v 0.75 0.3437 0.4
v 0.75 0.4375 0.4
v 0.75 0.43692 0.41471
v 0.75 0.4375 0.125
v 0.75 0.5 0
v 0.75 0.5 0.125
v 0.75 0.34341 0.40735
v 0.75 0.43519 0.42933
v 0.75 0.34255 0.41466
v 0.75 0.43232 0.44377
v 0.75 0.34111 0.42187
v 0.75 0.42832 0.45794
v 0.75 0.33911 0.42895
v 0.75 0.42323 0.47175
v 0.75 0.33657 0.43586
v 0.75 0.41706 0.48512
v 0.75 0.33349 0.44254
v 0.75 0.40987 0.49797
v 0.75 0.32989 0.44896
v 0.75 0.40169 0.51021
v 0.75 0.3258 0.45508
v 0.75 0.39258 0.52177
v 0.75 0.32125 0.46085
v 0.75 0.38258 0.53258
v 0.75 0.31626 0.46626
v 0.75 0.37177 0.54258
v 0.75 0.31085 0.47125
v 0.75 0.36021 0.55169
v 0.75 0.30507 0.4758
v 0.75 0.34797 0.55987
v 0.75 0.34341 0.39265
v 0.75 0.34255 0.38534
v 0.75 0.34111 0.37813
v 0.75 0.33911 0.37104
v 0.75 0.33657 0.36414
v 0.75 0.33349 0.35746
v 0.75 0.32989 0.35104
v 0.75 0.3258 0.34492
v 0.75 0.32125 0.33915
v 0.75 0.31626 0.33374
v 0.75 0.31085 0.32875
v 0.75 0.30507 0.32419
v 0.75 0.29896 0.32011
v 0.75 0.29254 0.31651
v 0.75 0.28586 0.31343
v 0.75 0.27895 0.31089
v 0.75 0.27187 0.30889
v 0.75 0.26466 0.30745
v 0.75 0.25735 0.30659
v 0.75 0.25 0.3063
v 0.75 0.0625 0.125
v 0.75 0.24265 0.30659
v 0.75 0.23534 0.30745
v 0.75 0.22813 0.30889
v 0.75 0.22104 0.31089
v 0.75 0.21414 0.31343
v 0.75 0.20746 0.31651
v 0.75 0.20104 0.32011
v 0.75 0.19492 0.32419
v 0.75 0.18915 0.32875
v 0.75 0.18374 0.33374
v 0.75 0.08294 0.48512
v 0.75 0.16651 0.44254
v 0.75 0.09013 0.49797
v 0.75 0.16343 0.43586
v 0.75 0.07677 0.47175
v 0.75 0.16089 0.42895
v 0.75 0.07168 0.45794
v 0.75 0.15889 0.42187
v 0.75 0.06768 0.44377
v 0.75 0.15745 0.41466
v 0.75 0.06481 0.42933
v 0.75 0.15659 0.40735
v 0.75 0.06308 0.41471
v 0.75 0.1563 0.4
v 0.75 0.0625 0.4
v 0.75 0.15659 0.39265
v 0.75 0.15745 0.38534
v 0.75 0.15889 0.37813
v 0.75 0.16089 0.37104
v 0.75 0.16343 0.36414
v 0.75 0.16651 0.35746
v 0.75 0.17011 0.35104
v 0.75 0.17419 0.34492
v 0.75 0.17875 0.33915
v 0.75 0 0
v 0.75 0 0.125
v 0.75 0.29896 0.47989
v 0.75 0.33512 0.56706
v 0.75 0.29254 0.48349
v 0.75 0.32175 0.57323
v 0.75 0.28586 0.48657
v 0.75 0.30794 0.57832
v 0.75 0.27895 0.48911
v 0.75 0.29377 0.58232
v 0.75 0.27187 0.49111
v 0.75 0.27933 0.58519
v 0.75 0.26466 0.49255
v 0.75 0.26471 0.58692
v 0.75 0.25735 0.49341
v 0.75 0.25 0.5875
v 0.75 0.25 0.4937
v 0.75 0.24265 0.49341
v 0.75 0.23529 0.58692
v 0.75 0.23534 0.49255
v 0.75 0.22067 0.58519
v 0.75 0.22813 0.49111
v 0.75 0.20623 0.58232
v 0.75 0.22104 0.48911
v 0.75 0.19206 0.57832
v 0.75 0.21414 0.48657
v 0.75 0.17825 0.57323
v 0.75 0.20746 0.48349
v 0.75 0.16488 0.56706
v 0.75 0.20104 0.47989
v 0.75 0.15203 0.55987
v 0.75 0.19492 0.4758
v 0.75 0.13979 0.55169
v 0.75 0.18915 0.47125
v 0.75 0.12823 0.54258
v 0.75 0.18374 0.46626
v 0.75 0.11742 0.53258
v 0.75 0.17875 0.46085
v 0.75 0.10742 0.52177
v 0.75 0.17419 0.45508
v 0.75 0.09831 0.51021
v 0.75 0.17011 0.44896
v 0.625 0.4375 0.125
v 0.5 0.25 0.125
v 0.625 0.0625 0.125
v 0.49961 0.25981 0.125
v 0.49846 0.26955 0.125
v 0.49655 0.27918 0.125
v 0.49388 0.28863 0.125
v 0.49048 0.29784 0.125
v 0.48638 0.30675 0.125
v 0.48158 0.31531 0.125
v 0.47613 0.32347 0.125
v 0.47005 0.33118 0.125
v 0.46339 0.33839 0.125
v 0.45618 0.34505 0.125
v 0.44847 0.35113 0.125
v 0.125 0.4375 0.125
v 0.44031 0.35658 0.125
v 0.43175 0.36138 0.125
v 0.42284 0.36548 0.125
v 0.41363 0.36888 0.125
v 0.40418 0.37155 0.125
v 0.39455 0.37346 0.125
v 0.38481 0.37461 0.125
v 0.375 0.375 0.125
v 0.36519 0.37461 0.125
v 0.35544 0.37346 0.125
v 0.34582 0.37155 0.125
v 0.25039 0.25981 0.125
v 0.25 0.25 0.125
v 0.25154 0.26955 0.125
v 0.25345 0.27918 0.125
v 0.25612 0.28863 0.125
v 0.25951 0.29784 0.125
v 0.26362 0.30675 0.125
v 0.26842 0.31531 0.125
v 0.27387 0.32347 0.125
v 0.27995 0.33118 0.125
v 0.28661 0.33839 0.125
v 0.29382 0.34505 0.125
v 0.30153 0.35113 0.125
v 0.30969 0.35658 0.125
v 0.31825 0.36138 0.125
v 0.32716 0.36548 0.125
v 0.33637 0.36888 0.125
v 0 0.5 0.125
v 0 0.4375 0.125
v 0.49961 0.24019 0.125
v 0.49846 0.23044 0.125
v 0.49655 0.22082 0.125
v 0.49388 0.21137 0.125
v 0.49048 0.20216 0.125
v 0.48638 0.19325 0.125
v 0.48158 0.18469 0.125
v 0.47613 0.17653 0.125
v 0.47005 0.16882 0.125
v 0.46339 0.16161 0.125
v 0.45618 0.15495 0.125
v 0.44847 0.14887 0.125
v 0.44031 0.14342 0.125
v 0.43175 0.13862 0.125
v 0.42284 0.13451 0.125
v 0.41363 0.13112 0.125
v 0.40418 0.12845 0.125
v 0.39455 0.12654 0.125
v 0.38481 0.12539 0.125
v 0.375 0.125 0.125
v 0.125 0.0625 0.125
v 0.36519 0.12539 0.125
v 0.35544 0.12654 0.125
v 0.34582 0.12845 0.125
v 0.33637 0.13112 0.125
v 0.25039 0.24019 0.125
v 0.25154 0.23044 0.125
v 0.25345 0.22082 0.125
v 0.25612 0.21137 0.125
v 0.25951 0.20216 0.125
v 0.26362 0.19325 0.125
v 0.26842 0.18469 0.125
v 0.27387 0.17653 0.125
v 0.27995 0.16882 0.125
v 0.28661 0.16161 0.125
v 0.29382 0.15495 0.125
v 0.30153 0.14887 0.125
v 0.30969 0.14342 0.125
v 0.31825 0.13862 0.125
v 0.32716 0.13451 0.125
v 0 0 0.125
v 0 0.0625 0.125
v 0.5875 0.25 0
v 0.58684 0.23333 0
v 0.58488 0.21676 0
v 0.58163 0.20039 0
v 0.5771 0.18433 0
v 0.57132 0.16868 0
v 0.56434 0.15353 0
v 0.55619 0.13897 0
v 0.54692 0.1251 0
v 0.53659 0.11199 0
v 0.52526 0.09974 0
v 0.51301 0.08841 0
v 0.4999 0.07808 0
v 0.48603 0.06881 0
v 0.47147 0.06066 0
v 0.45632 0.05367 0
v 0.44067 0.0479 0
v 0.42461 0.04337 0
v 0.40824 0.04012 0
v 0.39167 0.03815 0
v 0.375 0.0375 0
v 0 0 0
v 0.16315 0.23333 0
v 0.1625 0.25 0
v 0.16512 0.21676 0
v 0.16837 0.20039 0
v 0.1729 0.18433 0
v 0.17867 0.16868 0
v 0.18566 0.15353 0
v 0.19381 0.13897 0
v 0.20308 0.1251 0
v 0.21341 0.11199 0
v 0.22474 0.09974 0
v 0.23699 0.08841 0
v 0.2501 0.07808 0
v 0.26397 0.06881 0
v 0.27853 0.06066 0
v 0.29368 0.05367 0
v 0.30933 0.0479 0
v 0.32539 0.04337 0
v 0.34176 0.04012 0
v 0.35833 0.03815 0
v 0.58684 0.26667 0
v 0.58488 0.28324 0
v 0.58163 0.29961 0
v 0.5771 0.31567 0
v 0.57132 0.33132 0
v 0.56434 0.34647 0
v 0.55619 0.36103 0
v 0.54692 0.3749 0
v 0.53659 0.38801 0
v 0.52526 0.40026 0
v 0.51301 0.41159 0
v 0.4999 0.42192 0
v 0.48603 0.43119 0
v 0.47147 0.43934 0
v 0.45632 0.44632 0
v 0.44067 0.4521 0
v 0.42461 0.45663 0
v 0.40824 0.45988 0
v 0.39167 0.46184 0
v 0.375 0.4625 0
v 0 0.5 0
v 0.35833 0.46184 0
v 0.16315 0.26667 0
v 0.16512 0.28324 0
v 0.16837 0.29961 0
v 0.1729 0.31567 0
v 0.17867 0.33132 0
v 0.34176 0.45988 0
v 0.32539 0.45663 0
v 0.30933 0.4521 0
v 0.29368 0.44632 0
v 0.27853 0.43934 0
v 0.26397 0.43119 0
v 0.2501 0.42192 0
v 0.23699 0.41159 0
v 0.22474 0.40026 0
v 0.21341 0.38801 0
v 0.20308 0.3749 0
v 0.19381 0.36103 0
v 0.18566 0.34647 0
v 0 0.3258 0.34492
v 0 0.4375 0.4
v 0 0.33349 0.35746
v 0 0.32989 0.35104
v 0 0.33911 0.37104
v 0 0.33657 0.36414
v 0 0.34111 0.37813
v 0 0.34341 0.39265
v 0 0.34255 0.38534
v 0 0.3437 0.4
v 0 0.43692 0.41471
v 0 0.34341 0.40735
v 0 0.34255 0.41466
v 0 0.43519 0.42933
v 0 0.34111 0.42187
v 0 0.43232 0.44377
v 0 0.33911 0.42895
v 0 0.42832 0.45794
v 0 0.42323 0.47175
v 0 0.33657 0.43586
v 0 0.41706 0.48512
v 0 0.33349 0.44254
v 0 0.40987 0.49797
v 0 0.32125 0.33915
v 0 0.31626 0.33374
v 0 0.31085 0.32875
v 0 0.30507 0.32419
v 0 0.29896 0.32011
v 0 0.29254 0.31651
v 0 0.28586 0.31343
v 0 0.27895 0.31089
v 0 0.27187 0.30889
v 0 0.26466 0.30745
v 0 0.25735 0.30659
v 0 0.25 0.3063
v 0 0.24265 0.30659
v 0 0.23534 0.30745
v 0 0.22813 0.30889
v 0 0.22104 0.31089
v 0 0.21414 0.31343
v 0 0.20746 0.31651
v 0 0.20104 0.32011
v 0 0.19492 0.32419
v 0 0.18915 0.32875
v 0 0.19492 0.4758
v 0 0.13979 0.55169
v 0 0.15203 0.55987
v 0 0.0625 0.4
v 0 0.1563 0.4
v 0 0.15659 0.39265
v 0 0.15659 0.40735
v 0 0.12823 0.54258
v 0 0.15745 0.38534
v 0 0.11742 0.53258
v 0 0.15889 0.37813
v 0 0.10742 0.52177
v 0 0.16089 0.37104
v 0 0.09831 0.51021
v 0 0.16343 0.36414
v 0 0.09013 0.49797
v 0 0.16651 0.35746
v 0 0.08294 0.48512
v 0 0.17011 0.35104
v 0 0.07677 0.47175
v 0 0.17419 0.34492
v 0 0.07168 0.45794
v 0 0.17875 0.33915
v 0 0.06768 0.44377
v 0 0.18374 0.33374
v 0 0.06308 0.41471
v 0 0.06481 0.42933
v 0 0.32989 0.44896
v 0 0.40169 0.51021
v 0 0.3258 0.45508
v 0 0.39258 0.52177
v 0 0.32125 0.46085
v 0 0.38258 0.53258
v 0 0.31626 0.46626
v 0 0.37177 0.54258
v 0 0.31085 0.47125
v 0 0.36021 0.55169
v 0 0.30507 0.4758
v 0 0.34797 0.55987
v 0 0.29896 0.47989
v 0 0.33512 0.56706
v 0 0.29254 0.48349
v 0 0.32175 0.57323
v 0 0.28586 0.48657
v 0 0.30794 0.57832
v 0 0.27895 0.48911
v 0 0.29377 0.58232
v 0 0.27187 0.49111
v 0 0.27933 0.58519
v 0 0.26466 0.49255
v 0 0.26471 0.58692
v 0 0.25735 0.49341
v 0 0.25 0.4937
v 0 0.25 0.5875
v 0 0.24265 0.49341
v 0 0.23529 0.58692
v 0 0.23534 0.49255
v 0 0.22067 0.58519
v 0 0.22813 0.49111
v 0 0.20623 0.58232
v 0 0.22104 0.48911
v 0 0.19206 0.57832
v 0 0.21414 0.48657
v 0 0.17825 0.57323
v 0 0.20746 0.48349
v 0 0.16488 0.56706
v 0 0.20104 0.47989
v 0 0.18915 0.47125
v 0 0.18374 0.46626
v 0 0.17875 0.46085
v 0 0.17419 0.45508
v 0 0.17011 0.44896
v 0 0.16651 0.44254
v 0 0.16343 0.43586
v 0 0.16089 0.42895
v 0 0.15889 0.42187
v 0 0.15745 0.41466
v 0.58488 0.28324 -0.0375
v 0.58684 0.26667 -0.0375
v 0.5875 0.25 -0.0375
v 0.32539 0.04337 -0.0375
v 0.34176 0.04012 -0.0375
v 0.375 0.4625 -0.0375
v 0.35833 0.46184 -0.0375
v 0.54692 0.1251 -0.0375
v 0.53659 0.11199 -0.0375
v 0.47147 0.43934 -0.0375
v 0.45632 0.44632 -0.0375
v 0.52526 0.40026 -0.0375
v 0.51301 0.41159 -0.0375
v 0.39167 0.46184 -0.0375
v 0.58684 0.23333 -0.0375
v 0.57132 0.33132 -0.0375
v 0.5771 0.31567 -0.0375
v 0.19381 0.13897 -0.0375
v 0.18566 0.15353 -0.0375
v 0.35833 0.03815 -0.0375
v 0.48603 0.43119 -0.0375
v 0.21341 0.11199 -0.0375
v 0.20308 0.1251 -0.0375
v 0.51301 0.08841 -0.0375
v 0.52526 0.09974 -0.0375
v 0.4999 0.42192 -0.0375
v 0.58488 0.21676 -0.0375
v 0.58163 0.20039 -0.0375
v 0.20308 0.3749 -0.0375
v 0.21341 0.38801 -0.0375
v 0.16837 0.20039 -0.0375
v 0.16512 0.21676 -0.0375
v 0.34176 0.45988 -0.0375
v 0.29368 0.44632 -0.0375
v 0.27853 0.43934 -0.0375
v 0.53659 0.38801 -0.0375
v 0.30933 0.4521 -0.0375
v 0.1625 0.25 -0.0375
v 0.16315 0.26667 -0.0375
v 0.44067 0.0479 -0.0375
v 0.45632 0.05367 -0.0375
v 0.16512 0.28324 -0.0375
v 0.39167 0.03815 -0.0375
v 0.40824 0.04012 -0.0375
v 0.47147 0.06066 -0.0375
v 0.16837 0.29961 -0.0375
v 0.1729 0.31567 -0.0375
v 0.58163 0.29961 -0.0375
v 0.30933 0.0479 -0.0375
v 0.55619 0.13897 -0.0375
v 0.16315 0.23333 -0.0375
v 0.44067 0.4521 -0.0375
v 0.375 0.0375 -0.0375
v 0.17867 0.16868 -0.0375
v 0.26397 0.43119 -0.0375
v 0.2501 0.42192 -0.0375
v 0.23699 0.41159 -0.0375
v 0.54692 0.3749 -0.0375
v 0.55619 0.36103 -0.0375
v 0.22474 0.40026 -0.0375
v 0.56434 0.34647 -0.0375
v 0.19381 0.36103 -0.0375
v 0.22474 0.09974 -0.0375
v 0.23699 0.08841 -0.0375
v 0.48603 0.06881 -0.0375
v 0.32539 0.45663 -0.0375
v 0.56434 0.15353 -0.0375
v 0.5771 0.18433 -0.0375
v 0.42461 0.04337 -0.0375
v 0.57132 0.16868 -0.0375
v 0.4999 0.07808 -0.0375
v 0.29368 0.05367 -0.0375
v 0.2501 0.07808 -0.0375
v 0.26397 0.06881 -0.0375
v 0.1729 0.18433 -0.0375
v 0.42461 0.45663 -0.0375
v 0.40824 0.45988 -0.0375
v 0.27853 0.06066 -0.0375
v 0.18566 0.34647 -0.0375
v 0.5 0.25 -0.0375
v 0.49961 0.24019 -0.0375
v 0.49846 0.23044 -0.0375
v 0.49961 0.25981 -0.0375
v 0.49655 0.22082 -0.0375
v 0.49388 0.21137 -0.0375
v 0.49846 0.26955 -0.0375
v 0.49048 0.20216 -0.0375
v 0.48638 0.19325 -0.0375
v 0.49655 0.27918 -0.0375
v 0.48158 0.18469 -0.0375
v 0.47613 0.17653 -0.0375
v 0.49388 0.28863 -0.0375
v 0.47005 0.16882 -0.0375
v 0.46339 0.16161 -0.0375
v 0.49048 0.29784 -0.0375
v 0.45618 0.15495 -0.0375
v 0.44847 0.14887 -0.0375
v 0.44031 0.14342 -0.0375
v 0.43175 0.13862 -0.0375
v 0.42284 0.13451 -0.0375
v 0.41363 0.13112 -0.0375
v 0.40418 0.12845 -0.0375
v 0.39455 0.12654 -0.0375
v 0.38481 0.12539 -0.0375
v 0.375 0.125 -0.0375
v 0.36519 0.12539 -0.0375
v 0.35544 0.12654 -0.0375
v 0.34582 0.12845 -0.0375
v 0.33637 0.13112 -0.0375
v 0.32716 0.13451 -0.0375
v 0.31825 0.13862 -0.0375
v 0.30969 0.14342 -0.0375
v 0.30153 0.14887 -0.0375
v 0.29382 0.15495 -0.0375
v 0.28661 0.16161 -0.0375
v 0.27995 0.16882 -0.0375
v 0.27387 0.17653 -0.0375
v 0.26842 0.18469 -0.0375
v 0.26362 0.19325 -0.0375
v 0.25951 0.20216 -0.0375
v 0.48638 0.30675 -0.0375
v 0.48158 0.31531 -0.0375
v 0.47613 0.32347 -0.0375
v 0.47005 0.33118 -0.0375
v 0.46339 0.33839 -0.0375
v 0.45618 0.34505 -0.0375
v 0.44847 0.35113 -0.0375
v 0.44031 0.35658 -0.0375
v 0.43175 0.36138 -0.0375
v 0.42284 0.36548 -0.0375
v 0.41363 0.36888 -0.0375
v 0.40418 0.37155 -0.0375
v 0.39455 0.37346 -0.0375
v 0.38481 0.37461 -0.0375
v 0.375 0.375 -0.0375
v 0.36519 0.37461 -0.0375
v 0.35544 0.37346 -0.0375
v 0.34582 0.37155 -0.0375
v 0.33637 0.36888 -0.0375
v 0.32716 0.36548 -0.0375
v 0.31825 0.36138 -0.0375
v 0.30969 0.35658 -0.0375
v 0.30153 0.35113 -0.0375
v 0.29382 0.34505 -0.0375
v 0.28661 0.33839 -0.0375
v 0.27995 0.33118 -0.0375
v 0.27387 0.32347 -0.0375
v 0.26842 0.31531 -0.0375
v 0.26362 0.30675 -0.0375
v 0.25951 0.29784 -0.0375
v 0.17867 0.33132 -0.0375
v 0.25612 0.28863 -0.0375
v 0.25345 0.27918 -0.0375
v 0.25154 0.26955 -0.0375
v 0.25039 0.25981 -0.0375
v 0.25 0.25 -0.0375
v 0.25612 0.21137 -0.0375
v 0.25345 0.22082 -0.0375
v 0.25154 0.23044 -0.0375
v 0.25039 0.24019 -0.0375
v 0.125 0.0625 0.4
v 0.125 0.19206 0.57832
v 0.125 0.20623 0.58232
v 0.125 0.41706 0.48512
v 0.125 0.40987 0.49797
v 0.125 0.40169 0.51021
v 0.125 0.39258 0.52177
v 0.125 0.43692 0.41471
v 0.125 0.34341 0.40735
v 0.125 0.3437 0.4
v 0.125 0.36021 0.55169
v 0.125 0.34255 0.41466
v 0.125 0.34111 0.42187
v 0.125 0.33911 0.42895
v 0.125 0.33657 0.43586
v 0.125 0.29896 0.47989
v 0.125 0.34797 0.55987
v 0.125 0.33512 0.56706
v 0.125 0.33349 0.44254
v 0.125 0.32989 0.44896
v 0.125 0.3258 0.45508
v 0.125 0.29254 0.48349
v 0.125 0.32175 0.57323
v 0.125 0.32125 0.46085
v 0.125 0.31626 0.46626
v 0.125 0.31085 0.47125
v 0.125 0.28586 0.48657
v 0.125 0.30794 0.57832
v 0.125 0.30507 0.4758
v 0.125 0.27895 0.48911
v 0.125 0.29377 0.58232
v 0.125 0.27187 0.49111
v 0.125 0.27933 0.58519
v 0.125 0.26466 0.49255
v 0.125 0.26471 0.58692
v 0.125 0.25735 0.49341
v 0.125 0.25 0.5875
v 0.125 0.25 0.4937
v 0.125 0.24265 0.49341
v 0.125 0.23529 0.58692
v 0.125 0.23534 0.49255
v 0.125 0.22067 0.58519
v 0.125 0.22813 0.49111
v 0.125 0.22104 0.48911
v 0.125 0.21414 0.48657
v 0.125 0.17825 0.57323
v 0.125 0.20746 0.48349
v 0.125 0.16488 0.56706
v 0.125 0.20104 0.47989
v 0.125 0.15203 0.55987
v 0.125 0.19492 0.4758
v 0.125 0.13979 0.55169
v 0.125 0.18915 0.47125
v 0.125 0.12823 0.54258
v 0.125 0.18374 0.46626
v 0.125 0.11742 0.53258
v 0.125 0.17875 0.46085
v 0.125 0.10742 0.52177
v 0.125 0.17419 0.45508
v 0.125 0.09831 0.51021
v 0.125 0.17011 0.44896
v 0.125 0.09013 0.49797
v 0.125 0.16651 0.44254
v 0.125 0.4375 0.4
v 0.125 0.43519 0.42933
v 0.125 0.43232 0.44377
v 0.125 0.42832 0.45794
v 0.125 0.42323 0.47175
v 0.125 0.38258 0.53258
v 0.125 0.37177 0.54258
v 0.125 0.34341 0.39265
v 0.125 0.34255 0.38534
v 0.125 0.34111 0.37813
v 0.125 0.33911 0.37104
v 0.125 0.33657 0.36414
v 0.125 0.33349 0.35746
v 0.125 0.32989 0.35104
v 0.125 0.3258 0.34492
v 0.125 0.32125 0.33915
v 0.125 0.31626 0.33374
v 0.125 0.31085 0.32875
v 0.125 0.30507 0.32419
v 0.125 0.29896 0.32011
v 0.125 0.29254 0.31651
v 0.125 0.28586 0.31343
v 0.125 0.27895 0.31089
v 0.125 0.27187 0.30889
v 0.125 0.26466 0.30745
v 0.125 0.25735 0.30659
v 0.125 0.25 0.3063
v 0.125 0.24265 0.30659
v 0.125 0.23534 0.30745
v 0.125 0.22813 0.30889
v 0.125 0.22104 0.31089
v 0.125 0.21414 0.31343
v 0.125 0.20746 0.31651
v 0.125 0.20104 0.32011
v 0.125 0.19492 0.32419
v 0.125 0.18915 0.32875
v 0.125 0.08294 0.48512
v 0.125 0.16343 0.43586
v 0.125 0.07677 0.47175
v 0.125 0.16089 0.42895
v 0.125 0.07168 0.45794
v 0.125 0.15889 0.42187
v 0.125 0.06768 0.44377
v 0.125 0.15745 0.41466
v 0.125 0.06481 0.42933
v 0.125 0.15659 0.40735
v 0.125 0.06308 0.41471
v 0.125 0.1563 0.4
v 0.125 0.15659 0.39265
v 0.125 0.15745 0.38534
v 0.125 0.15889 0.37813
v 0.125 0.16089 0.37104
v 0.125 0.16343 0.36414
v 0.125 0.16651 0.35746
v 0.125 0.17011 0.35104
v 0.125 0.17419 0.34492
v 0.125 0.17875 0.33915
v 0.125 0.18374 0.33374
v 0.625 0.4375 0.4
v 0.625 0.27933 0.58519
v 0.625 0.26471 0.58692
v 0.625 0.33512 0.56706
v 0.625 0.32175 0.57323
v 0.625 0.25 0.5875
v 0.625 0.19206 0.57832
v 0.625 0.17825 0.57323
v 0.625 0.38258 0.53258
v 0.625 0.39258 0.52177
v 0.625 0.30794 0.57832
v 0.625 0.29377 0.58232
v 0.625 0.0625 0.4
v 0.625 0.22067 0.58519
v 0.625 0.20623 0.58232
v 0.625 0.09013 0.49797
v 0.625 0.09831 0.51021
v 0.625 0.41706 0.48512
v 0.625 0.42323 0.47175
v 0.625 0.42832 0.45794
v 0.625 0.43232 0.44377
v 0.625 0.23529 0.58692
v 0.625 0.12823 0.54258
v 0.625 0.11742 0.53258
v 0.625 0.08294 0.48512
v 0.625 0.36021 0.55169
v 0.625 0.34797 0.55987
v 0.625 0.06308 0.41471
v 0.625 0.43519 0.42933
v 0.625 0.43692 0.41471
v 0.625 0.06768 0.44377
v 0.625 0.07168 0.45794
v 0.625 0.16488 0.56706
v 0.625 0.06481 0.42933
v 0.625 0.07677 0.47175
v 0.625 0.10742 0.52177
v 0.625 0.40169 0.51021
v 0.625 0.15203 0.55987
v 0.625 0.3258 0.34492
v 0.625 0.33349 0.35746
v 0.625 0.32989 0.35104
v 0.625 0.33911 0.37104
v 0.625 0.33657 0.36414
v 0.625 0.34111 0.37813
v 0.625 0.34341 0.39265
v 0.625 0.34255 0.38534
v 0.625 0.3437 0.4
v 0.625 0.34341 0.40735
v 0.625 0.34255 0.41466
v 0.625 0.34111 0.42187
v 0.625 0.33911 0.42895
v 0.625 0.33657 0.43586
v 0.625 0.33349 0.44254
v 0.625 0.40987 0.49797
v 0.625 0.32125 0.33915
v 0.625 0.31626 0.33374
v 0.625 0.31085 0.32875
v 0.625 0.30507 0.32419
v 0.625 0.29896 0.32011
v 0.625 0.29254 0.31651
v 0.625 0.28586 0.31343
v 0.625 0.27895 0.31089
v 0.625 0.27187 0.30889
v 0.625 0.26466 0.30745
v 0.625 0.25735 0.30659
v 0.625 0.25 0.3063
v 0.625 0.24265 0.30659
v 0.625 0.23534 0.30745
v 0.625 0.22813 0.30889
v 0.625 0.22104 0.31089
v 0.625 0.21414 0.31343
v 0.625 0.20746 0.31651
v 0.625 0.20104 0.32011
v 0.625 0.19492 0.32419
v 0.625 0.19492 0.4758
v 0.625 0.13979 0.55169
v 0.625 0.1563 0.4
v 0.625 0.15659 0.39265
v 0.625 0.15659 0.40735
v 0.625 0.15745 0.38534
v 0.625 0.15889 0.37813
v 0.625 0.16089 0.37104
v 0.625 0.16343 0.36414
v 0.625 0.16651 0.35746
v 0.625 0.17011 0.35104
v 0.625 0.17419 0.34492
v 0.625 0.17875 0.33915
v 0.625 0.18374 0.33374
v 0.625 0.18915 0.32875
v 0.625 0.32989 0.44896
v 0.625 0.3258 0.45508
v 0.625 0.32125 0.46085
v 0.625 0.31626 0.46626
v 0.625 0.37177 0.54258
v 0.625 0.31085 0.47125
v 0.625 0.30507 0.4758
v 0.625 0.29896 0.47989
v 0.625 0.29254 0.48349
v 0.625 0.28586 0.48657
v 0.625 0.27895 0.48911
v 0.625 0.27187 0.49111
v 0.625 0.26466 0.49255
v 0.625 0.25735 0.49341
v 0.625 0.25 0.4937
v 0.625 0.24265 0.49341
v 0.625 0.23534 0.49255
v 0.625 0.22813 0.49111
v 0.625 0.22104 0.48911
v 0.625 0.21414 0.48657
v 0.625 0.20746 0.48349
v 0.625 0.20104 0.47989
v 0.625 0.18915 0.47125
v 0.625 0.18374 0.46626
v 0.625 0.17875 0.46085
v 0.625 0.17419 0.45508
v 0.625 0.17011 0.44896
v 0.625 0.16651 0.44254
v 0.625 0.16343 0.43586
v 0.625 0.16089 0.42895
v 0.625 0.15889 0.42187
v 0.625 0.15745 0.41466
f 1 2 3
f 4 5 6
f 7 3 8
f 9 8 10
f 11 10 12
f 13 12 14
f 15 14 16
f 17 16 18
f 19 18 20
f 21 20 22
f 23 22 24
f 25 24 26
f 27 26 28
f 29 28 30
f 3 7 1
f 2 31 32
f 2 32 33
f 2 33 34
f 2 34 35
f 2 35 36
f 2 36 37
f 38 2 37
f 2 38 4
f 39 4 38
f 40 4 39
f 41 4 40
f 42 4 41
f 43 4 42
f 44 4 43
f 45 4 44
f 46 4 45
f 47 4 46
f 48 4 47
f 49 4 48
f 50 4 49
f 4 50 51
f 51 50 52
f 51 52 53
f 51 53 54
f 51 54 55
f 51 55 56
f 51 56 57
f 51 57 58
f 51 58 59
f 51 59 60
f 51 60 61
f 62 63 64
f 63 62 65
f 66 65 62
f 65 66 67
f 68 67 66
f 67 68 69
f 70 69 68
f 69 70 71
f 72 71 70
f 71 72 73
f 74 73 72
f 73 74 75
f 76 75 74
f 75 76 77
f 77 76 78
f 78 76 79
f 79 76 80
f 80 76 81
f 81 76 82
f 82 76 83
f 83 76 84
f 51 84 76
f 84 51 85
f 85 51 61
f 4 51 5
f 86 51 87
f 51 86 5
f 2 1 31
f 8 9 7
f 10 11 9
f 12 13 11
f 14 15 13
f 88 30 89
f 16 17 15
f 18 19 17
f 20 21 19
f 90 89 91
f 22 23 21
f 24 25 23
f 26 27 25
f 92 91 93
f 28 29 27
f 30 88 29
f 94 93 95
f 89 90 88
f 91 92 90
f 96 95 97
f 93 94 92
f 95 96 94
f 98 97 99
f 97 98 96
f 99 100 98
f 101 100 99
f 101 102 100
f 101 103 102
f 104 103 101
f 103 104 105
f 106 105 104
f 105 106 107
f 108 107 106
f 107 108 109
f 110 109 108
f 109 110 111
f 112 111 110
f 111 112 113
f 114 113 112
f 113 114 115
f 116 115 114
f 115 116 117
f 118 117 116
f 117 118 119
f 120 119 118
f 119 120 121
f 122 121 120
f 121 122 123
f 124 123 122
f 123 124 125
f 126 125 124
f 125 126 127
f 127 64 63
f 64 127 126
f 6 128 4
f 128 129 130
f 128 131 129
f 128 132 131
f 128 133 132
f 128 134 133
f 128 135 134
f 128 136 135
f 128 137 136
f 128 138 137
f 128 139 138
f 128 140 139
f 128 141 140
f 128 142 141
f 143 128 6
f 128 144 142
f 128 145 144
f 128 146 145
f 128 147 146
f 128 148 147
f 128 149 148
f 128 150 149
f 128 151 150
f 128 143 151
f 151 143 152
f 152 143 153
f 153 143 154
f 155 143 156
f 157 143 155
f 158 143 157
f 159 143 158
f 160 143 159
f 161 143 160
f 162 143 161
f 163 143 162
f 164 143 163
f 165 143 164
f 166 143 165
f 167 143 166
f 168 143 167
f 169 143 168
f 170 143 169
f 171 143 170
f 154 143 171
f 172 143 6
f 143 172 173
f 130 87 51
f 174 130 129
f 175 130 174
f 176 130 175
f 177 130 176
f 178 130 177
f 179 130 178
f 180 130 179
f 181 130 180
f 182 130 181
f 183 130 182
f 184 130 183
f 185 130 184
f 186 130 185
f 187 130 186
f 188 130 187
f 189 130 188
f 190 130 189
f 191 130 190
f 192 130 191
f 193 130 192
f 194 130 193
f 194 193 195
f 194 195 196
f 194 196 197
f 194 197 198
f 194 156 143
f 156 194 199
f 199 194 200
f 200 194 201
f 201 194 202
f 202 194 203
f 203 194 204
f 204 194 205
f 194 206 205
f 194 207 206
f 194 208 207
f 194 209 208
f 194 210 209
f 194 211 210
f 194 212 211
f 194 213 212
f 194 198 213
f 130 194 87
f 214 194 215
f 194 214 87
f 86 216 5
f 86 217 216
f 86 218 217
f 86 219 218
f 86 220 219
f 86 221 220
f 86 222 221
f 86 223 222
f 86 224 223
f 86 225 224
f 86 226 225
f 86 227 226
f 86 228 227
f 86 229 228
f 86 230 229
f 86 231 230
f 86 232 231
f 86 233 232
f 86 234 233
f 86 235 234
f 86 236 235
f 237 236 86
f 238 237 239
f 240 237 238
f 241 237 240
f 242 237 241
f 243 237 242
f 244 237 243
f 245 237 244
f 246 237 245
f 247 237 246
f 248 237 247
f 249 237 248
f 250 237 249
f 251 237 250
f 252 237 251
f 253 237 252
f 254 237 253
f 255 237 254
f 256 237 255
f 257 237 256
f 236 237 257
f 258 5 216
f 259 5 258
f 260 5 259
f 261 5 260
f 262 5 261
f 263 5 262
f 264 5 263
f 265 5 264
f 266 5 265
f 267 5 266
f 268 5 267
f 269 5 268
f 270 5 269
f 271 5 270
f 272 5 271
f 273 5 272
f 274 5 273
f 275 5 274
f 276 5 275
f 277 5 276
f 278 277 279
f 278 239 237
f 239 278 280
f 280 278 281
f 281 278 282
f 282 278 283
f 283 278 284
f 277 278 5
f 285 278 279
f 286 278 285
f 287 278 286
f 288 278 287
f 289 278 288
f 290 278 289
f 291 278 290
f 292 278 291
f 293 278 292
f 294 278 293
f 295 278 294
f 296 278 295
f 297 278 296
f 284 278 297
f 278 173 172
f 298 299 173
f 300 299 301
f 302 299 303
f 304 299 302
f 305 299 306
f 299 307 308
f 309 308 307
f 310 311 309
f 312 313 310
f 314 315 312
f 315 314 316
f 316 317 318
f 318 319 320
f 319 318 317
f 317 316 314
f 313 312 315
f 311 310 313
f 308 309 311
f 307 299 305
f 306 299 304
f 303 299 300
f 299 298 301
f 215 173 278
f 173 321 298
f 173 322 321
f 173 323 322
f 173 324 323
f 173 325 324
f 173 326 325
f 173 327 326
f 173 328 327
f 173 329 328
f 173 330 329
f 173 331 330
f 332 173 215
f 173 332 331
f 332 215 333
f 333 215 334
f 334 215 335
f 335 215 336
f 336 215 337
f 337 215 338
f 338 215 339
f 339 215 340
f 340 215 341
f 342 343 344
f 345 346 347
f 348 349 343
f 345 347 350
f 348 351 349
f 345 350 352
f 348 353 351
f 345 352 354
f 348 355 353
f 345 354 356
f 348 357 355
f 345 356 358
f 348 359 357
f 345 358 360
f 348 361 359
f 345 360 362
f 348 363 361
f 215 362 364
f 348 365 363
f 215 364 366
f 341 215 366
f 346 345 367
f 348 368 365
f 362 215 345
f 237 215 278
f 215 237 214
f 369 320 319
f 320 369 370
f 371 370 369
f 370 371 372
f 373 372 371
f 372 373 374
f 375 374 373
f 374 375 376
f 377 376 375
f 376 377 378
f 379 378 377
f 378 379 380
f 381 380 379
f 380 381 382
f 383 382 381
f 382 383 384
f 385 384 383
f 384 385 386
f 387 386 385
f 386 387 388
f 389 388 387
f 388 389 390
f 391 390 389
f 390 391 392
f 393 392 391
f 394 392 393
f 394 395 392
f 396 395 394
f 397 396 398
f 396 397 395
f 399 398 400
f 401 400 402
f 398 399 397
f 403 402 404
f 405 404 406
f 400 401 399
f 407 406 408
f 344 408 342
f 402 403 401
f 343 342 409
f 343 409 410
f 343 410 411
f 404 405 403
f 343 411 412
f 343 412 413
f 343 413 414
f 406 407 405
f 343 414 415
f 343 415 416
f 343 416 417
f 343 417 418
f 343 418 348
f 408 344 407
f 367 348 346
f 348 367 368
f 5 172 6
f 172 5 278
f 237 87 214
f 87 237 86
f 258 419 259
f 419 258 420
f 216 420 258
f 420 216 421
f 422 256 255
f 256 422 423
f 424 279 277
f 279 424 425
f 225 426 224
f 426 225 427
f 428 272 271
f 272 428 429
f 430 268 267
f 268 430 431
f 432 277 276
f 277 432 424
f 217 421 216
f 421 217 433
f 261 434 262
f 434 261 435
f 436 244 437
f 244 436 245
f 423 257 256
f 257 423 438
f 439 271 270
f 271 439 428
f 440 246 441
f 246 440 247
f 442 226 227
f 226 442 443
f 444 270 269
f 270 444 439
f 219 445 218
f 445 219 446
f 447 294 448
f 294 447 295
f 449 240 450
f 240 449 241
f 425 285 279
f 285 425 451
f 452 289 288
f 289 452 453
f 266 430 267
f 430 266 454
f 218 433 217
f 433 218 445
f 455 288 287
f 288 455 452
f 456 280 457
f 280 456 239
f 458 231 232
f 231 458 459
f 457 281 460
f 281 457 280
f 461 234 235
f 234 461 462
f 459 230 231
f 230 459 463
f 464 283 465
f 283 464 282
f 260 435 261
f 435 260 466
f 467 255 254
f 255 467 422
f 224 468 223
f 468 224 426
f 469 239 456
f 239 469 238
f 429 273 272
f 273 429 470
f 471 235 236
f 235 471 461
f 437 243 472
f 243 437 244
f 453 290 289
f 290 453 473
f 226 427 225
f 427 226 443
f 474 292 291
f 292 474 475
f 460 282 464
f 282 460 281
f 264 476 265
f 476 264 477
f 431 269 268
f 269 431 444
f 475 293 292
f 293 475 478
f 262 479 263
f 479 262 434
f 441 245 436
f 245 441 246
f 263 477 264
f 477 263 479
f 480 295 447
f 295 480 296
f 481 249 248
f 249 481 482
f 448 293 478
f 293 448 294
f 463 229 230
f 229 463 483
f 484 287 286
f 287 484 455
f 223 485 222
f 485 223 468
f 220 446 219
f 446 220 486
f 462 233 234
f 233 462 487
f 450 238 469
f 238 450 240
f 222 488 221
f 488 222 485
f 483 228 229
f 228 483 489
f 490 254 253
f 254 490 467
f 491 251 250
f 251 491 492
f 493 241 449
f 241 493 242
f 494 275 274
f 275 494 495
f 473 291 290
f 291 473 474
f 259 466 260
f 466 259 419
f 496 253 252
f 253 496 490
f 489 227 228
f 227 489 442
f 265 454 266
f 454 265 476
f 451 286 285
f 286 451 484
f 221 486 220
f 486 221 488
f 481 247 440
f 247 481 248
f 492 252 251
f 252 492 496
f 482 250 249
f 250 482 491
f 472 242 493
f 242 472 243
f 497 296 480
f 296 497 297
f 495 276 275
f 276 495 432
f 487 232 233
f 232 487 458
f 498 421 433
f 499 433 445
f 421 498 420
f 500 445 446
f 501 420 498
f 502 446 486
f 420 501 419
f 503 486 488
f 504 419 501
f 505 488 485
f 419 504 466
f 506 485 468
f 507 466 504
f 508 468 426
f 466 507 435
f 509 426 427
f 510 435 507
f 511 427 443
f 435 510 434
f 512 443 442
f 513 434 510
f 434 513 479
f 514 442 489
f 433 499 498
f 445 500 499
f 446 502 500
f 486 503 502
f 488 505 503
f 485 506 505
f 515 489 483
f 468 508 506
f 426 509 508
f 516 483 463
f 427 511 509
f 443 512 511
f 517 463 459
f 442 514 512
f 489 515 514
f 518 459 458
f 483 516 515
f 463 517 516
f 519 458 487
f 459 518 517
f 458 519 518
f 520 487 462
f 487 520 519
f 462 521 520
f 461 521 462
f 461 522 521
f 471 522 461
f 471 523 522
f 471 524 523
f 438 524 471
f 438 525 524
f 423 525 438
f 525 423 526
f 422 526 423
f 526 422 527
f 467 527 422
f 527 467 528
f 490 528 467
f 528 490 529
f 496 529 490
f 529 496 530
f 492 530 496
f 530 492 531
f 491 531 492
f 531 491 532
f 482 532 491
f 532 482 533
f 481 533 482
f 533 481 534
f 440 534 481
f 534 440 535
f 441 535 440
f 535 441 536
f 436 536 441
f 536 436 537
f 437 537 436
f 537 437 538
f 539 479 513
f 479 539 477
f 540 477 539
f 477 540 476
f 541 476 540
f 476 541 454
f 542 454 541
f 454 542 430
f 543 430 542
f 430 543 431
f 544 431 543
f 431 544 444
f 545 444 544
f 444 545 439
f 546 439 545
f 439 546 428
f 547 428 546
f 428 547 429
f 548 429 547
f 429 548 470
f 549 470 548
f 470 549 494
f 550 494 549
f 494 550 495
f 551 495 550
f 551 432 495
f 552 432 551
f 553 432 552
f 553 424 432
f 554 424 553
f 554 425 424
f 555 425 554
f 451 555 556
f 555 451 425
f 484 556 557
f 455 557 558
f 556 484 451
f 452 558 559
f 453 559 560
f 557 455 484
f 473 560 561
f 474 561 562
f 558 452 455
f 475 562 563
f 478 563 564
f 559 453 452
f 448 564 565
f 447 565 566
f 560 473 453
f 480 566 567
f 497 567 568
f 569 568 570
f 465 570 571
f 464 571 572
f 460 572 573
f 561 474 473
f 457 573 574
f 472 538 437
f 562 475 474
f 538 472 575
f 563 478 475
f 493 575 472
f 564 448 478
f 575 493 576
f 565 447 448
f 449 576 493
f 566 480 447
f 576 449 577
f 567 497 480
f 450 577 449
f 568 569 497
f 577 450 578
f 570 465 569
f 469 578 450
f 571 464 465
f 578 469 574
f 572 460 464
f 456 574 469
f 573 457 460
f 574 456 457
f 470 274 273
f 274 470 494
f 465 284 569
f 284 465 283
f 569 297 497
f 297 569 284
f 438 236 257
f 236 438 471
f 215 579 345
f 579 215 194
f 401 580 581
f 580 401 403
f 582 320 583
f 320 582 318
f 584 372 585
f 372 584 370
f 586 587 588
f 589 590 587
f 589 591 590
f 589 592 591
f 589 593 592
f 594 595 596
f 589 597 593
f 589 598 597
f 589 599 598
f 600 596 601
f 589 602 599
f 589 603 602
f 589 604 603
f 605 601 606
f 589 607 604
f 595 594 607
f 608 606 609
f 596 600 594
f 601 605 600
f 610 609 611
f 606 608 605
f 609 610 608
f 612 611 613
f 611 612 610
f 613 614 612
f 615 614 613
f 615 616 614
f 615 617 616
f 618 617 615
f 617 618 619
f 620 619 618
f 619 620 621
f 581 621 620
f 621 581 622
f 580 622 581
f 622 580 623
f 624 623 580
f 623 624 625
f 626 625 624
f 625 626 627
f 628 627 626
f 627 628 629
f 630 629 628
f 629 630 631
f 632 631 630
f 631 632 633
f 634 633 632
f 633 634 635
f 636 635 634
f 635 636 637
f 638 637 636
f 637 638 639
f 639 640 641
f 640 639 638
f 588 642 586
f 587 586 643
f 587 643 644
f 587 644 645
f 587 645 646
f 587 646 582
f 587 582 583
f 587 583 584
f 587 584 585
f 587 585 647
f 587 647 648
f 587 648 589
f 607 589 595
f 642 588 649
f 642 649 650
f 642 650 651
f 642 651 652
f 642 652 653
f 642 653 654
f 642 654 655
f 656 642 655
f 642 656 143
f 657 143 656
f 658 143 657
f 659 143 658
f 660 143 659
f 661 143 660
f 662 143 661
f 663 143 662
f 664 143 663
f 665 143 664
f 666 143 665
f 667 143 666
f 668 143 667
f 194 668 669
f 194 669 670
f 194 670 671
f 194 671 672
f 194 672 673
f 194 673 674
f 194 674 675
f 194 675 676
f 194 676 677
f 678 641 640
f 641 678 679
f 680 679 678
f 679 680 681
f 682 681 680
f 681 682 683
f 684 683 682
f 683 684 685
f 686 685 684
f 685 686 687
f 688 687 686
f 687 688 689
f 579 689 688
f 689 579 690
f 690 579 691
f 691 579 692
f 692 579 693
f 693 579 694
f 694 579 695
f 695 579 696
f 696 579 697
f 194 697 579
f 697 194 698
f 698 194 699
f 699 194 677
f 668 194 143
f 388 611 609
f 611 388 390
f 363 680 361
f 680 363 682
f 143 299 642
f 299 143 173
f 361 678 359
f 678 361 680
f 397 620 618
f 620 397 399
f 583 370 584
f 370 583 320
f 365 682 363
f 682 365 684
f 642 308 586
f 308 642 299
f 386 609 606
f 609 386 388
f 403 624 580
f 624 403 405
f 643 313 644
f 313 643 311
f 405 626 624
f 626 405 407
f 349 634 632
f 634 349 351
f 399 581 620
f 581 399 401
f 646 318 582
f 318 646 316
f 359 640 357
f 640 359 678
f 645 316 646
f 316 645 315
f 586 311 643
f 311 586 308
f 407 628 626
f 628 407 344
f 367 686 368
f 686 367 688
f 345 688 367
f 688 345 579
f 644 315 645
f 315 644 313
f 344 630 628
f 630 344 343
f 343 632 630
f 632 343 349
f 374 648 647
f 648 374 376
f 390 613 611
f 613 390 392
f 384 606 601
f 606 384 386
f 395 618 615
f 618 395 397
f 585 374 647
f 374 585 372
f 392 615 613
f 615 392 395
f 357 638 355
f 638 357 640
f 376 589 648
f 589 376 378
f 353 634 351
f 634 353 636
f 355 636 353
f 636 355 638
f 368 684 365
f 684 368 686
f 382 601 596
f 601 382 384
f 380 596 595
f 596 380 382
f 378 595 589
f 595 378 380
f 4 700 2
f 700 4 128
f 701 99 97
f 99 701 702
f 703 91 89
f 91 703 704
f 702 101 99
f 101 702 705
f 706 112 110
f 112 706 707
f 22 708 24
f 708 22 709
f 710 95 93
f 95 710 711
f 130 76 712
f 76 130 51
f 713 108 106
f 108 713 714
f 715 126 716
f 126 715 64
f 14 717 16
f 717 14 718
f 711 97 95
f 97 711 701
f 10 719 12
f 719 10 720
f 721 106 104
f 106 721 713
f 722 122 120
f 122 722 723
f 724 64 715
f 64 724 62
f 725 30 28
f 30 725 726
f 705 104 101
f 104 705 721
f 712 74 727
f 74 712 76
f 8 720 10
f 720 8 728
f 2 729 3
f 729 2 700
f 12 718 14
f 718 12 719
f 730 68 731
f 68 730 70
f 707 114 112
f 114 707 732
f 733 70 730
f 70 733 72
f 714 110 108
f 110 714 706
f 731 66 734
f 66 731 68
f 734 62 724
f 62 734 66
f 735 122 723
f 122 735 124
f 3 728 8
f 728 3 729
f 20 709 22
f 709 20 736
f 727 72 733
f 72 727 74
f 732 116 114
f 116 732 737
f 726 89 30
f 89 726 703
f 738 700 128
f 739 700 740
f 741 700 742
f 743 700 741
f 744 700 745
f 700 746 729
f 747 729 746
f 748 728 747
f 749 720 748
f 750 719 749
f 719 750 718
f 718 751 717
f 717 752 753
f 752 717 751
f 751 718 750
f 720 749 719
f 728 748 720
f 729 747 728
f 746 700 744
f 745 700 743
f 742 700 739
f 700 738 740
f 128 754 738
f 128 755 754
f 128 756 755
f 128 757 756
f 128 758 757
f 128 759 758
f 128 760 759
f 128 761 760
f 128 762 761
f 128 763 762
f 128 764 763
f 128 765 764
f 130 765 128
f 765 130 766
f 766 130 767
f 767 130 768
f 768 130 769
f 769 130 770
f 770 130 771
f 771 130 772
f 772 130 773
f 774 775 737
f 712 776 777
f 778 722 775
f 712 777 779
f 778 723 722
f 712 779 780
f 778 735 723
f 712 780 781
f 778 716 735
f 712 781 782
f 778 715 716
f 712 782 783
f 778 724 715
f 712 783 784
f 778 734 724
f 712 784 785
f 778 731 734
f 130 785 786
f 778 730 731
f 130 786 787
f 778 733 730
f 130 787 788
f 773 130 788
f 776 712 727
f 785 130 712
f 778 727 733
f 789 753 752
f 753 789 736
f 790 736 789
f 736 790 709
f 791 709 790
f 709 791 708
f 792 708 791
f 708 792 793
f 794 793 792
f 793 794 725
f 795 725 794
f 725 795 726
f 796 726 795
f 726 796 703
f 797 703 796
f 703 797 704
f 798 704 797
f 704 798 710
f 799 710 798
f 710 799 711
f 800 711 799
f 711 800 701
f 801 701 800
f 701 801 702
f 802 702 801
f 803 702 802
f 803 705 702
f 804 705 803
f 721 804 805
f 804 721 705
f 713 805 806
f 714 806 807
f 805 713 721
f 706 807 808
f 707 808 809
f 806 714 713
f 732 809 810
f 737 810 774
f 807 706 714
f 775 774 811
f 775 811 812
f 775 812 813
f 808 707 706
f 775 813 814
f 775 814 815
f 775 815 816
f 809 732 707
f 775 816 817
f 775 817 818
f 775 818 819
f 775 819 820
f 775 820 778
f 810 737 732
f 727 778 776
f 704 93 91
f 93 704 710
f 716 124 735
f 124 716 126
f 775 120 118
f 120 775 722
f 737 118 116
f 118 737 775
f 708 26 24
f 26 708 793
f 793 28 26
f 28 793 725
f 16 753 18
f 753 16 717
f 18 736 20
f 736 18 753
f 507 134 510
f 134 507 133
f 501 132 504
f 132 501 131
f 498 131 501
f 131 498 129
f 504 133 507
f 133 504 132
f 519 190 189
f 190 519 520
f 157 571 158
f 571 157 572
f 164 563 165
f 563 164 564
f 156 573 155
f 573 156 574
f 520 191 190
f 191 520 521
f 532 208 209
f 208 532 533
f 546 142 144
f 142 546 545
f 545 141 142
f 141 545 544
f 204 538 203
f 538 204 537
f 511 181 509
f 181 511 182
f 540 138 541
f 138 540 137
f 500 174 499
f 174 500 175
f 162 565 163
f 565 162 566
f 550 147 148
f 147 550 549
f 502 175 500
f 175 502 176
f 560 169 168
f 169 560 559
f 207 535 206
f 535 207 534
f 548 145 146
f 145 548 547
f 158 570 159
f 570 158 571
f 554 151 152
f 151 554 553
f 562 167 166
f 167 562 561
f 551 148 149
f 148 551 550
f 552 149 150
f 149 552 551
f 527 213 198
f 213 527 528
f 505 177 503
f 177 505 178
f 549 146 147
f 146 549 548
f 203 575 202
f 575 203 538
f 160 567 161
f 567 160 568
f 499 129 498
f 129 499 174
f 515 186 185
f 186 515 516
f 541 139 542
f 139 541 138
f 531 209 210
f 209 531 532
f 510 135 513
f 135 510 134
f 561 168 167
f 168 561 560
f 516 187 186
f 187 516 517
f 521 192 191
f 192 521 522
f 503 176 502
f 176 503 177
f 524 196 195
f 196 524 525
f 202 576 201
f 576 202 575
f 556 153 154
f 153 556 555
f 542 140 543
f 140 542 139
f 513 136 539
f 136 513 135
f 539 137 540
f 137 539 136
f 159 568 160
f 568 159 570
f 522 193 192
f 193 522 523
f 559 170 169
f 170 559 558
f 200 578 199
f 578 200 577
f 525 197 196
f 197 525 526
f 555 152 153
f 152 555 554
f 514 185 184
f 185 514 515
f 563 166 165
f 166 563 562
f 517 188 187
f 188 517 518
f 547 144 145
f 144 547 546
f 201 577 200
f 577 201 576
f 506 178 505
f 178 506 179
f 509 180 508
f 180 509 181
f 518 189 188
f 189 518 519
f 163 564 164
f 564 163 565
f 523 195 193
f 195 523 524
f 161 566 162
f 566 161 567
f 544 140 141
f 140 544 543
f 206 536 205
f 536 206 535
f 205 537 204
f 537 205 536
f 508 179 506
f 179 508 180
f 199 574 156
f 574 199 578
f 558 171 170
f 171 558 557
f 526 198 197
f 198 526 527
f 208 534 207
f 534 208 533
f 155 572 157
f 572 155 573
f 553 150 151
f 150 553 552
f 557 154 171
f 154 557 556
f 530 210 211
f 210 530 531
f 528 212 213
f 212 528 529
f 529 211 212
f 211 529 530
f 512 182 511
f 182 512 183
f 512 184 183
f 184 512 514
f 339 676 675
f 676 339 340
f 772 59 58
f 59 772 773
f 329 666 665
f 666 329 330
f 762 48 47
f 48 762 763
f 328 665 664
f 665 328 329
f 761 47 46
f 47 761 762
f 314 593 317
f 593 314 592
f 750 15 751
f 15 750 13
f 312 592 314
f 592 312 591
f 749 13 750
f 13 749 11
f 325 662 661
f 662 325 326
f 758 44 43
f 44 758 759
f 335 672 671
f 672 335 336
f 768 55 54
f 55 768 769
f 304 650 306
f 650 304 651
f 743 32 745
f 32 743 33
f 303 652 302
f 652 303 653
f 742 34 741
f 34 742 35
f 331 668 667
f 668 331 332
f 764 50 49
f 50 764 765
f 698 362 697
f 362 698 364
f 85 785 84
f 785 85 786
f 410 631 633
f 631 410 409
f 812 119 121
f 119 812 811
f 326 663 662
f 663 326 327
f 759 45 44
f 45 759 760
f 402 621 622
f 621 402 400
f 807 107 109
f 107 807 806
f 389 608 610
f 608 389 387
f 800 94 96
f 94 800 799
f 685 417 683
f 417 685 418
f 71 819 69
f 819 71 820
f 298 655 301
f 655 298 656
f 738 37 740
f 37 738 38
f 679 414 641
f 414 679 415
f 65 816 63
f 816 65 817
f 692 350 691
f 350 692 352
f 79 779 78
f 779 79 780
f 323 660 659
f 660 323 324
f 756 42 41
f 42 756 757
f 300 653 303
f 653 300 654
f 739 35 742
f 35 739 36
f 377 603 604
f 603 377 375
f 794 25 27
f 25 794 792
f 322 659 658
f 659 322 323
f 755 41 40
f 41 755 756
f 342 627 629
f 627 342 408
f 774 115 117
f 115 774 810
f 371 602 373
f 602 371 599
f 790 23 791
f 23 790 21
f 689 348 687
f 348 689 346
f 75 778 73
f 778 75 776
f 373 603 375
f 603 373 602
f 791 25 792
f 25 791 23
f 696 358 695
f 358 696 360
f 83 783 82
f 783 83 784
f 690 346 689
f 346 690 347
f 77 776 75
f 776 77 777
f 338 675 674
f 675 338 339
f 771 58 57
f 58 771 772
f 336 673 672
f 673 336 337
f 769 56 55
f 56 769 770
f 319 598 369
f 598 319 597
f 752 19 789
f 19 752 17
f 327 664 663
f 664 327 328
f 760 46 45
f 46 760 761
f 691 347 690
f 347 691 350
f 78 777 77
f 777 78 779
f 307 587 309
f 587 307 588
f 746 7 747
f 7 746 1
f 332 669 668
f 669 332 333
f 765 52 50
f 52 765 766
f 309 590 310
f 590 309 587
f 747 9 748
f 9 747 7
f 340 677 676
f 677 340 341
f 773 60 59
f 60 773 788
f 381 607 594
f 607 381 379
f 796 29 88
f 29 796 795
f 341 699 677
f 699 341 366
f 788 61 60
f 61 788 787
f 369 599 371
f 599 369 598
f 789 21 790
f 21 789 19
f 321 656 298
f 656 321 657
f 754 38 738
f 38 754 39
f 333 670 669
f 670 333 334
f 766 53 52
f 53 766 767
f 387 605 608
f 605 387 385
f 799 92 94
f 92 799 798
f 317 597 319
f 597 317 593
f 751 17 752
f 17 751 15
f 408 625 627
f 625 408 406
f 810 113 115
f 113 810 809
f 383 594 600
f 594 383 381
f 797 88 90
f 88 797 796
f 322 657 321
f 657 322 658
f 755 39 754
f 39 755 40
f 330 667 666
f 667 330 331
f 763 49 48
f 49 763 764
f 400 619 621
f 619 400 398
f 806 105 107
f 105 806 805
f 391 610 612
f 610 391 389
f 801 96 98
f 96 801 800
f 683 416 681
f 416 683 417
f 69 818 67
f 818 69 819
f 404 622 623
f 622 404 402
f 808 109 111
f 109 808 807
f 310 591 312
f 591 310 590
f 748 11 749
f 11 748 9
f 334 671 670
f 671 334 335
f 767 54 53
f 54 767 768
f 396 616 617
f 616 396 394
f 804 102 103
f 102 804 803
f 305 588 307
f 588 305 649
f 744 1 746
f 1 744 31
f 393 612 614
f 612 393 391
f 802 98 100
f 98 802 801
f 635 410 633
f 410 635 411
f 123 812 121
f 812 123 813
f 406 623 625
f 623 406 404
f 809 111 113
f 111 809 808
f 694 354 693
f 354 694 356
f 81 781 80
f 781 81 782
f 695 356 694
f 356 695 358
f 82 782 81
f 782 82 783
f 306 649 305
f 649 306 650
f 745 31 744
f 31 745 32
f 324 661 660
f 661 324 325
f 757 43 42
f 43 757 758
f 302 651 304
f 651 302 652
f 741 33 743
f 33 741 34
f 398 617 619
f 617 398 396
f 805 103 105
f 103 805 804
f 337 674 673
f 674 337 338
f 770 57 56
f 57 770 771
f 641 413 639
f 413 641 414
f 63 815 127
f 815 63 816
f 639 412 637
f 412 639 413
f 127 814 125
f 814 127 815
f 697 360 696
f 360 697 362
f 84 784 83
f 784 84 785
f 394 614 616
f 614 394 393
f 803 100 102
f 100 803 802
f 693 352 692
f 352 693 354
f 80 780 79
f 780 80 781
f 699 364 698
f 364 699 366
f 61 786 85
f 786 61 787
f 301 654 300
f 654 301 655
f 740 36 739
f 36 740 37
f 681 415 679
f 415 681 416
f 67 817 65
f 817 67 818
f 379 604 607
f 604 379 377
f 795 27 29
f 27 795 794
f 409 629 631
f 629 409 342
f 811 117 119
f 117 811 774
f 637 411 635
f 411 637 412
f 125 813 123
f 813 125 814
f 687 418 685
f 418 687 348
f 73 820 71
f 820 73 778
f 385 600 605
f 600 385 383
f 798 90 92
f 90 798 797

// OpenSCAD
// Parameters
base_length    = 0.75;
base_width     = 0.5;
base_height    = 0.125;

bore_x         = 0.375;
bore_y         = 0.25;
bore_r         = 0.125;

collar_h       = 0.0375;
collar_or      = 0.2125;

tab_thick      = 0.125;
tab_width      = 0.375;
tab_y_off      = 0.0625;
tab_top_z      = 0.5875;
tab_hole_r     = 0.0937;
tab_hole_z     = tab_top_z - tab_width / 2;

left_tab_x     = 0;
right_tab_x    = base_length - tab_thick;

$fn = 80;
eps = 0.02;

// Arc-edged base plate (full 0.75 x 0.5 footprint)
module base_plate() {
    cube([base_length, base_width, base_height]);
}

// Underside annular collar (hollow ring, not a pad)
module collar() {
    translate([bore_x, bore_y, -collar_h])
        cylinder(h = collar_h + eps, r = collar_or);
}

// Upright rounded / slot-like tab (elevation stadium head)
module rounded_tab(x) {
    hull() {
        translate([x, tab_y_off, 0])
            cube([tab_thick, tab_width, base_height]);
        translate([x, bore_y, tab_hole_z])
            rotate([0, 90, 0])
                cylinder(h = tab_thick, r = tab_width / 2);
    }
}

// Central through void (base + collar)
module bore_hole() {
    translate([bore_x, bore_y, -collar_h - eps])
        cylinder(h = base_height + collar_h + 2 * eps, r = bore_r);
}

// Coaxial openings through tab thickness
module tab_holes() {
    translate([-eps, bore_y, tab_hole_z])
        rotate([0, 90, 0])
            cylinder(h = base_length + 2 * eps, r = tab_hole_r);
}

// Main model
difference() {
    union() {
        base_plate();
        collar();
        rounded_tab(left_tab_x);
        rounded_tab(right_tab_x);
    }
    bore_hole();
    tab_holes();
}
